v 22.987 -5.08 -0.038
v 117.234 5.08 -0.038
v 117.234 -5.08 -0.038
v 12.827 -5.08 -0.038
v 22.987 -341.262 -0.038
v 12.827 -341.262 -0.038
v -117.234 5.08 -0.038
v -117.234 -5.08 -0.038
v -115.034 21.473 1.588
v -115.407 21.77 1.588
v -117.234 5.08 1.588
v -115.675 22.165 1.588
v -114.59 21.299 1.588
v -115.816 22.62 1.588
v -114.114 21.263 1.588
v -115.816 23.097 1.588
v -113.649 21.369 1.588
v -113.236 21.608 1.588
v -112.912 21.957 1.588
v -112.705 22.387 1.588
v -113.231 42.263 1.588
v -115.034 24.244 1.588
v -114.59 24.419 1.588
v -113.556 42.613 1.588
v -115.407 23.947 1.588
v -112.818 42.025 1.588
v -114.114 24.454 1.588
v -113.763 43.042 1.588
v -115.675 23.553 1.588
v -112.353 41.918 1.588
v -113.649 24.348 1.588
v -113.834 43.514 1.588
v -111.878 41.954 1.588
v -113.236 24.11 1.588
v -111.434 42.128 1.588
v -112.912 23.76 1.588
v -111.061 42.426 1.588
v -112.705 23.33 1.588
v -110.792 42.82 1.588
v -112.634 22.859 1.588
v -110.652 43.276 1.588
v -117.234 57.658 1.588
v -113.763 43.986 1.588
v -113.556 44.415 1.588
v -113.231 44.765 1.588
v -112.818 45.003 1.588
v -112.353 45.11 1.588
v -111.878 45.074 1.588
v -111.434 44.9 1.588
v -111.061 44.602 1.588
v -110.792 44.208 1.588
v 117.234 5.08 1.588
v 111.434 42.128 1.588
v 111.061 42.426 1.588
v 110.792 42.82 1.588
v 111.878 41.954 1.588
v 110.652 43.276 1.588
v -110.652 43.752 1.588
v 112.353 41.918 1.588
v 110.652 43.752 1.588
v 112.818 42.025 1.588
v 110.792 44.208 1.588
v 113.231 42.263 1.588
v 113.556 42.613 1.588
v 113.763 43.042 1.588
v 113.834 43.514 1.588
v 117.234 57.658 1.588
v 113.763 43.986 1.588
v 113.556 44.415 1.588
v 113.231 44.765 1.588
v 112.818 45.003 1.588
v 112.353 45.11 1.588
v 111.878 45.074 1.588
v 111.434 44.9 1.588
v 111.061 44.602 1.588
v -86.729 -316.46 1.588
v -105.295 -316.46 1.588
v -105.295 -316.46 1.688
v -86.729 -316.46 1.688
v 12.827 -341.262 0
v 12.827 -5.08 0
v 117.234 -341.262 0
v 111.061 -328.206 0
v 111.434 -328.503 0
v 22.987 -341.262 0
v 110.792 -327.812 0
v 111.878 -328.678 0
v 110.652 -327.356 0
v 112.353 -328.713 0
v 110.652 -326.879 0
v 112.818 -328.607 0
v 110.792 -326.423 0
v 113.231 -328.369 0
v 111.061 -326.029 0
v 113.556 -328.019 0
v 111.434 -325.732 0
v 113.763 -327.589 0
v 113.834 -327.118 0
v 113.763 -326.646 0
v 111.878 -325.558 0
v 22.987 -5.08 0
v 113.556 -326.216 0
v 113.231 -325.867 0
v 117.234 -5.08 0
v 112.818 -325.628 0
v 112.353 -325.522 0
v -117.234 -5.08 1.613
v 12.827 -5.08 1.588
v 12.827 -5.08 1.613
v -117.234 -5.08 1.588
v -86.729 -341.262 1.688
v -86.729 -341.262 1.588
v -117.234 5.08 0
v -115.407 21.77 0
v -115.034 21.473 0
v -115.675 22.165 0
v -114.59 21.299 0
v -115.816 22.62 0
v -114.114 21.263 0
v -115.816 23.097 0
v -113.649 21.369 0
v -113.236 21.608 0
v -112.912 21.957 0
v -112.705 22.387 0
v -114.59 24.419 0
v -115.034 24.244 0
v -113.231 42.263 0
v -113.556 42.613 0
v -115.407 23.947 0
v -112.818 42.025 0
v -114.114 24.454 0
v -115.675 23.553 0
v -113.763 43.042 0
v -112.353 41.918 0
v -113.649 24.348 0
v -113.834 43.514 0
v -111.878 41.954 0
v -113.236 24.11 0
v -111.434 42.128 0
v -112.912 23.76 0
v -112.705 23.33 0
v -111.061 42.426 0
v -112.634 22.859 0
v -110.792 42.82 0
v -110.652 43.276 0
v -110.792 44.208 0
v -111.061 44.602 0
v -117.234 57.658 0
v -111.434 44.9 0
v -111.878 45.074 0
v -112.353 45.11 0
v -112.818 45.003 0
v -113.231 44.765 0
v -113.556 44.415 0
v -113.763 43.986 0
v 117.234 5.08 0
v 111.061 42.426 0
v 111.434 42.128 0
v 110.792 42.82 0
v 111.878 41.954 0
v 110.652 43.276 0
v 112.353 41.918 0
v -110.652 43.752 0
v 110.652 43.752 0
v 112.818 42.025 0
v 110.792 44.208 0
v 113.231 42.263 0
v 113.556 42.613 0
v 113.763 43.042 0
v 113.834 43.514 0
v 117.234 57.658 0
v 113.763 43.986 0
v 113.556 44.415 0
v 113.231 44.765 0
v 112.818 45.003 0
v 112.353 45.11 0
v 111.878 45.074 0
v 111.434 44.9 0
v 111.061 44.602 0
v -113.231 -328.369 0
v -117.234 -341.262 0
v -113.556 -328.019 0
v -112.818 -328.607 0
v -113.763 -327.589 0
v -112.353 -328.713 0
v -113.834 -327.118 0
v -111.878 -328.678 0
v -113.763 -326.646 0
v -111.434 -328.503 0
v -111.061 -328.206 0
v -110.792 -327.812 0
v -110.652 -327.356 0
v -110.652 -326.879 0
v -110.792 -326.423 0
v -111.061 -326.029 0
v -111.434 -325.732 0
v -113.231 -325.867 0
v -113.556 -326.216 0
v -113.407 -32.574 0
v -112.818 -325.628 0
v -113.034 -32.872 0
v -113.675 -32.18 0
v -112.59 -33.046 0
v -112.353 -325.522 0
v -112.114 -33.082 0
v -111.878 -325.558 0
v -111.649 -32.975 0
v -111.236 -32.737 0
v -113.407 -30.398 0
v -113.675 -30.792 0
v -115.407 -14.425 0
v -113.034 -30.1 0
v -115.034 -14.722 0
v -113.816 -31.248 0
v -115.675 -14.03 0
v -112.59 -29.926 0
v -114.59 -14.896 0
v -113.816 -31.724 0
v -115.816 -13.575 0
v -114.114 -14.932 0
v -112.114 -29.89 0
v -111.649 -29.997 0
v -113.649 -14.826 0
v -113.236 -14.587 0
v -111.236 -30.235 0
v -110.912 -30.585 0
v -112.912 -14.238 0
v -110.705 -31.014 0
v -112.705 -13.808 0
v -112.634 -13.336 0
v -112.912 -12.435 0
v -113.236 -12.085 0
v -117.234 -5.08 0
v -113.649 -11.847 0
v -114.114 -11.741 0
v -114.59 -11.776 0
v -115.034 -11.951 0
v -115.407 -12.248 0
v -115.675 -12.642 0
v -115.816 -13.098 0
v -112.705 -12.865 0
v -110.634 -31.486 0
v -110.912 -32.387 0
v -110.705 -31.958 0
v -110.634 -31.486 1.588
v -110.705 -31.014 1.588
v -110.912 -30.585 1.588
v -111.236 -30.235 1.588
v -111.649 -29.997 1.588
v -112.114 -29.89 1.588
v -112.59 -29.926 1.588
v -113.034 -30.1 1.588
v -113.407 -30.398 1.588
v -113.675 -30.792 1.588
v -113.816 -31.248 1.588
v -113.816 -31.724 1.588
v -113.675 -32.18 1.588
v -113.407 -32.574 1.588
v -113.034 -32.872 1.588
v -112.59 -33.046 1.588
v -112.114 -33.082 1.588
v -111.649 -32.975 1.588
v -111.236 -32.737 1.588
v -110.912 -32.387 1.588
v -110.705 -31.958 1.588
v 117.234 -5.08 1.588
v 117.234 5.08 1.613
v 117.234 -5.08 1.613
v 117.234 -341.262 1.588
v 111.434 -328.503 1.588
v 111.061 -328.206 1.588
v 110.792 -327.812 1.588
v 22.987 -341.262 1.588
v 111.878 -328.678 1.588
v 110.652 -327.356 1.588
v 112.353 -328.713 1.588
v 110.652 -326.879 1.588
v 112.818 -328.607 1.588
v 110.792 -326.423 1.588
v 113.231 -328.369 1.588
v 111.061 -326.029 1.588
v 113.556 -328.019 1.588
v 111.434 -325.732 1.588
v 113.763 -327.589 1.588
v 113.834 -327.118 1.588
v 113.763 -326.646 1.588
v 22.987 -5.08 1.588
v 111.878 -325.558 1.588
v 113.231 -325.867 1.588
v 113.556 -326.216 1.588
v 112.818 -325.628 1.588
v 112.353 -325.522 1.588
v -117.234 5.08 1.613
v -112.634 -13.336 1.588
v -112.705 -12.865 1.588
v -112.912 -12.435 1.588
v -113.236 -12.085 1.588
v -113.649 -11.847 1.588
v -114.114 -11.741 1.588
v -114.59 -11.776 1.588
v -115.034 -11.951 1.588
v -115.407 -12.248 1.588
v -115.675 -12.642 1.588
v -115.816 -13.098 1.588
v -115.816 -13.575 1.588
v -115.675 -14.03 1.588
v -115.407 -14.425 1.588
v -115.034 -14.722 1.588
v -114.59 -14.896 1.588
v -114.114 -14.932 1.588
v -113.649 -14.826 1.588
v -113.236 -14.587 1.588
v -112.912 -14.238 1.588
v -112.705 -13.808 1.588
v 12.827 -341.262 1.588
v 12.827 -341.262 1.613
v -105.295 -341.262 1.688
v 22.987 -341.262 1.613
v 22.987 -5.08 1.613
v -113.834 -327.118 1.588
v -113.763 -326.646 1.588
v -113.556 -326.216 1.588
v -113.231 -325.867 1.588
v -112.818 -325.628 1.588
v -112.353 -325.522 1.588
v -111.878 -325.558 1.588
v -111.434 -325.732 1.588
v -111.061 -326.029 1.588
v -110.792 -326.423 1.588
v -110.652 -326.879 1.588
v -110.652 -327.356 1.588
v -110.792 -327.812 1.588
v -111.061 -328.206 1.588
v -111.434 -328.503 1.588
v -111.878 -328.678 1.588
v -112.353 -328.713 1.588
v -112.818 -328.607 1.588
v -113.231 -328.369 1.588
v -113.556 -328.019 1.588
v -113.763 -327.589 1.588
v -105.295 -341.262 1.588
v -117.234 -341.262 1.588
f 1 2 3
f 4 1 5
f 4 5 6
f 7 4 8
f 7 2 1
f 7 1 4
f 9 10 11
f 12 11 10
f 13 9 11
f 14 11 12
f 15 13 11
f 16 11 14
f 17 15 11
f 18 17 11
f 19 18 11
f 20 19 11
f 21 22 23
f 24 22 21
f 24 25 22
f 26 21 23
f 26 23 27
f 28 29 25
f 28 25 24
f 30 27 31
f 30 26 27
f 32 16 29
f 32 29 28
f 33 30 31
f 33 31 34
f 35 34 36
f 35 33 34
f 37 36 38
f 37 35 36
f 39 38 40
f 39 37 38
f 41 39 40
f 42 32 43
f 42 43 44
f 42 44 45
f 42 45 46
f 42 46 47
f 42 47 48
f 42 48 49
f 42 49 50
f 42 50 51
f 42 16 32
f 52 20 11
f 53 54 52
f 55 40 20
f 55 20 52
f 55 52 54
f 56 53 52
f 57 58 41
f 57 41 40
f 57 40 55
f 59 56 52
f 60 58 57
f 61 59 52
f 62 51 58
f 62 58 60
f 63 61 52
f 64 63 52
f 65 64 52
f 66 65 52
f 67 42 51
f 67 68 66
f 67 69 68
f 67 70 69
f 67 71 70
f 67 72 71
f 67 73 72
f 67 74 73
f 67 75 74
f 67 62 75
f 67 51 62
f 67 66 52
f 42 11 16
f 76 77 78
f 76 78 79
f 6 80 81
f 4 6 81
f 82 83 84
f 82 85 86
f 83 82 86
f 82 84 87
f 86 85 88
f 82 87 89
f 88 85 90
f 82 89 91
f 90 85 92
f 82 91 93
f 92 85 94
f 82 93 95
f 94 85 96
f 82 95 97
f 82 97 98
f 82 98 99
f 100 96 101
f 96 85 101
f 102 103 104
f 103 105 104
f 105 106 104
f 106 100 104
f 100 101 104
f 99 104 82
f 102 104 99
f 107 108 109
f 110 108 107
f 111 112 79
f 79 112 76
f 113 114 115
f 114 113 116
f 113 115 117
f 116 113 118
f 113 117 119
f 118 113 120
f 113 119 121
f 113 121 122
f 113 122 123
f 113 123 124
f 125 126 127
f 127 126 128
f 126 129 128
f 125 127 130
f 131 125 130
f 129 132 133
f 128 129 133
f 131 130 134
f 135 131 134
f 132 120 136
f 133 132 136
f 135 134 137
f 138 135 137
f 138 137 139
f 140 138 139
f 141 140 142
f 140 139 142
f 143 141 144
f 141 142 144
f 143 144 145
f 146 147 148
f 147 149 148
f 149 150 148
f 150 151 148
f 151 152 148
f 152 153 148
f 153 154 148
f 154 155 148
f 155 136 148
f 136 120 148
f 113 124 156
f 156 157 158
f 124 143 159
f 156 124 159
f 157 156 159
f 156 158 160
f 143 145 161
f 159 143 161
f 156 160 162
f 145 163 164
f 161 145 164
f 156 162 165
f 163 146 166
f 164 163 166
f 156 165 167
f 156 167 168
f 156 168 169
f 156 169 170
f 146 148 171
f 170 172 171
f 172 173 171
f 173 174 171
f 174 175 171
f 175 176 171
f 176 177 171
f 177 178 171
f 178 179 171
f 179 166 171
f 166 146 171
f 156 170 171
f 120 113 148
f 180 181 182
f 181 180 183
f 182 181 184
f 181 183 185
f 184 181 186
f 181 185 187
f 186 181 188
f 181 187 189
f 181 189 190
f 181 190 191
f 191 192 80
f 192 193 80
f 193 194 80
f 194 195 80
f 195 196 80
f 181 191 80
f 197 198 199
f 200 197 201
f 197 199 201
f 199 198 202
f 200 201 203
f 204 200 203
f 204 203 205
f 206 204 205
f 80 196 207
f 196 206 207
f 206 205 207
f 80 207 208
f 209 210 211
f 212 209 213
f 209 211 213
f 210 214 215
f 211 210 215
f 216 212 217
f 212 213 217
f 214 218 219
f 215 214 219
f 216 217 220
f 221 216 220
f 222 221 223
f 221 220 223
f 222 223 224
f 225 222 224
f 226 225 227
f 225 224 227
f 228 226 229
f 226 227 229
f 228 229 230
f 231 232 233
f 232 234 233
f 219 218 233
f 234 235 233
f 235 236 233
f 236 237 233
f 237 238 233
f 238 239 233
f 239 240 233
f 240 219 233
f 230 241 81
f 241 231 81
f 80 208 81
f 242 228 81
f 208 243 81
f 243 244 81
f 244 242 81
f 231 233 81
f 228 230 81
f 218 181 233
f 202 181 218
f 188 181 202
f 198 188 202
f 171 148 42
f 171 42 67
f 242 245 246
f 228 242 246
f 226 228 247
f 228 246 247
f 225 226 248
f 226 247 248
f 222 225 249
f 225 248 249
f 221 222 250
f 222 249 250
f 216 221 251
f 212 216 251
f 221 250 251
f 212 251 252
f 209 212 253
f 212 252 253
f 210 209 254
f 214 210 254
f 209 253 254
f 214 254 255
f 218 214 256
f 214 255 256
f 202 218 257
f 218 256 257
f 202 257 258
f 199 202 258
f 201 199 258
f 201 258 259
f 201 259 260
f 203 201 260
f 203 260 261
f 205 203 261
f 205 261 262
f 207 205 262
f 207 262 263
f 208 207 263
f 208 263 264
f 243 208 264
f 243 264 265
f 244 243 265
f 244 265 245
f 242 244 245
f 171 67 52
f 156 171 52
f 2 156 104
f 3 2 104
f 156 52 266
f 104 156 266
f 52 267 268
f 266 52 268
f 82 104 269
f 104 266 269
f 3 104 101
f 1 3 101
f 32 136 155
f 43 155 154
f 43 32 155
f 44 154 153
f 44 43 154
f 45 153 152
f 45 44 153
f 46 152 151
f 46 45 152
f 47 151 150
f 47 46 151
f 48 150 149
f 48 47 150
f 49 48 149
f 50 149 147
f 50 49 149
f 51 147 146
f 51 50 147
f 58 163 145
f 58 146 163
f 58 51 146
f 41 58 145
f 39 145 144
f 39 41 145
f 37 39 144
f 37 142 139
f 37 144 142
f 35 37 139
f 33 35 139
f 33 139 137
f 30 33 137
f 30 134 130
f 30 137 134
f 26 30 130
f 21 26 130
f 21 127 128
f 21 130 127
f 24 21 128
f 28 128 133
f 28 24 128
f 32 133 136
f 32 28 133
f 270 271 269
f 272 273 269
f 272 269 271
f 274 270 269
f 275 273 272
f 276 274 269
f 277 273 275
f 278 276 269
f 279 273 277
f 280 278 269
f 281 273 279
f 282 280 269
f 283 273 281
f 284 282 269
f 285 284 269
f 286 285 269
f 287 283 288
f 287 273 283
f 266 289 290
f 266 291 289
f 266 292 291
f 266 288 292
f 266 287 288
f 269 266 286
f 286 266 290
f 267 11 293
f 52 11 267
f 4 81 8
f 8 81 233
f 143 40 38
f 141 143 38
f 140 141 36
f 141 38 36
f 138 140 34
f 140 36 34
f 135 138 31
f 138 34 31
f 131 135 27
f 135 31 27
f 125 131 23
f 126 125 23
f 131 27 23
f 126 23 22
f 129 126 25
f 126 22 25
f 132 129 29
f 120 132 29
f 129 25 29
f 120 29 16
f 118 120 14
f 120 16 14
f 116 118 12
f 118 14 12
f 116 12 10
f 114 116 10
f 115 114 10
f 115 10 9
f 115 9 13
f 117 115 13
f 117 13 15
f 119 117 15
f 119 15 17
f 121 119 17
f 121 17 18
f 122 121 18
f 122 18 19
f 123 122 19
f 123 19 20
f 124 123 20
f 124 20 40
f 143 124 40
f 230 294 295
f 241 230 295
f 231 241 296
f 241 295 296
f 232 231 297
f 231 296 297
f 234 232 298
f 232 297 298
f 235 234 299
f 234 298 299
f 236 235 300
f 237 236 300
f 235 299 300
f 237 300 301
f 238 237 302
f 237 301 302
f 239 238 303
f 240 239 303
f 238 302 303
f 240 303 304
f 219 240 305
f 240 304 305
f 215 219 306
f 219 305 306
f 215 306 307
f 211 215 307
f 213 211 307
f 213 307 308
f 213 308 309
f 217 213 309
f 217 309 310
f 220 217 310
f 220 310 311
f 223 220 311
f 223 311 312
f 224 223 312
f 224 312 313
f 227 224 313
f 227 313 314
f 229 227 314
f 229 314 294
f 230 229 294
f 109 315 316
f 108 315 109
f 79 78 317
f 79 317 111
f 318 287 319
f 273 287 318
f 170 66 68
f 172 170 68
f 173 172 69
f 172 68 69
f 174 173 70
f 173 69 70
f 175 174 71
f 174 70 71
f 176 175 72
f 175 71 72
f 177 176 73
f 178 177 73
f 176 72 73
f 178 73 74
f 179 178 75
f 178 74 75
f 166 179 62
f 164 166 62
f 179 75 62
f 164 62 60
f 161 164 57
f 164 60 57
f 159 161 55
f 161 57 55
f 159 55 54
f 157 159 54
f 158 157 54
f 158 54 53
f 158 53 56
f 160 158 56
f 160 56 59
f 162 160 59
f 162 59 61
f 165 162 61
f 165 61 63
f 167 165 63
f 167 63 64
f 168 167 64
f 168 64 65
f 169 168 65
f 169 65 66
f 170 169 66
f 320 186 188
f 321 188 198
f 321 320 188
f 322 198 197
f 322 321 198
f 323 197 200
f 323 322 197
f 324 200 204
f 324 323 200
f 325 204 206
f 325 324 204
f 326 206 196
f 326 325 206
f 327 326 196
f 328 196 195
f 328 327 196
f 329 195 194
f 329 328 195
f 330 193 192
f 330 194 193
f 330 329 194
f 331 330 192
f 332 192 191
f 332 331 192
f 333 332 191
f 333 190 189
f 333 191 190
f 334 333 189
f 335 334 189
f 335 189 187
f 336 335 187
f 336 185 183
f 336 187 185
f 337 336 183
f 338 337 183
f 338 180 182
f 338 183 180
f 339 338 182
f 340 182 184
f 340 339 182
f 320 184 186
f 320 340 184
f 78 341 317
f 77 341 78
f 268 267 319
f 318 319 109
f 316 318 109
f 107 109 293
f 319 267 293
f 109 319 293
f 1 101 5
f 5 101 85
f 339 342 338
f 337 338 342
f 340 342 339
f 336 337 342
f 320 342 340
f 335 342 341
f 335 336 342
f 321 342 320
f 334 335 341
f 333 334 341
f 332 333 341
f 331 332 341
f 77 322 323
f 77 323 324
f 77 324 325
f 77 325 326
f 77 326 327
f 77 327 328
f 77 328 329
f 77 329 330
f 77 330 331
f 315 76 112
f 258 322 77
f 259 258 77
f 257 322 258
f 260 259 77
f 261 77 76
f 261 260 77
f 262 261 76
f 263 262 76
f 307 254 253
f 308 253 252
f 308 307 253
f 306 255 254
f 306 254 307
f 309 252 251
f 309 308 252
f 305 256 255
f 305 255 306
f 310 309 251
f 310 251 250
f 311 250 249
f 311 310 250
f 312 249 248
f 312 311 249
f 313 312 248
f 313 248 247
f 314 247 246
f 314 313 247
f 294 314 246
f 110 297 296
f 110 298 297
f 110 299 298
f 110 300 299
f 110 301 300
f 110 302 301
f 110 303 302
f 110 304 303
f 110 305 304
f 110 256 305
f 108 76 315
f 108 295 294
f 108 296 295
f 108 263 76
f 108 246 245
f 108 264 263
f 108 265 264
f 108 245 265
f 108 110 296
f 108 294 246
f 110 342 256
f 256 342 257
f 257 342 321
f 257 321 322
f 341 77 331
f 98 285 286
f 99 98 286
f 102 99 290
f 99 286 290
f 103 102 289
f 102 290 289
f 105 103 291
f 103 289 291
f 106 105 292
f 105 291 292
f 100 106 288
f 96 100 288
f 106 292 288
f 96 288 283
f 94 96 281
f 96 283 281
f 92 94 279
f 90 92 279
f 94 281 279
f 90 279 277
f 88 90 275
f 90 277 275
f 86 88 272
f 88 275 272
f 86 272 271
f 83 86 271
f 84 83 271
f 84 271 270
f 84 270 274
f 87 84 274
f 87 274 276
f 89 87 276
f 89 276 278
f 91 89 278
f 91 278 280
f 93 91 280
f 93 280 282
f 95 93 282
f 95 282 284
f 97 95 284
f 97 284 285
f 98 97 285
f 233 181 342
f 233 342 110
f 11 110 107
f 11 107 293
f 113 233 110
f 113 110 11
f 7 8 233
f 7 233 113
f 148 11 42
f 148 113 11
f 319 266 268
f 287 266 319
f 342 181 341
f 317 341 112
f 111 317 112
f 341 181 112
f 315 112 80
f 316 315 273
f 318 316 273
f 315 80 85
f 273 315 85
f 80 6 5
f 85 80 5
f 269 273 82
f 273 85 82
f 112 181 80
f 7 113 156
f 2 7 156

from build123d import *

# Parameters (mm, degrees)
SKETCH1_W                = 234.4674
SKETCH1_H                = 398.9197
BOSS_EXTRUDE1_DEPTH      = 1.5875
BOSS_EXTRUDE2_DEPTH      = 0.0254
BOSS_EXTRUDE2_DEPTH_BACK = 1.6254
SKETCH5_R                = 1.6
CUT_EXTRUDE1_DEPTH       = 2.6254
SKETCH6_W                = 18.565945636
SKETCH6_H                = 24.802104659
BOSS_EXTRUDE3_DEPTH      = 0.1
SKETCH8_R                = 1.6
CUT_EXTRUDE2_DEPTH       = 2.6254
SKETCH7_R                = 1.6
CUT_EXTRUDE3_DEPTH       = 10


with BuildPart() as part:
    # Sketch1 → Boss-Extrude1 (new body)
    with BuildSketch(Plane.XY):
        with Locations((0, -141.80185)):
            Rectangle(SKETCH1_W, SKETCH1_H)
    extrude(amount=BOSS_EXTRUDE1_DEPTH)

    # Sketch4 → Boss-Extrude2 (add, two sides)
    with BuildSketch(Plane.XY.offset(1.5875)) as boss_extrude2_sk:
        Polygon((-117.2337, 5.08), (117.2337, 5.08), (117.2337, -5.08), (22.987, -5.08), (22.987, -341.2617), (12.827, -341.2617), (12.827, -5.08), (-117.2337, -5.08), align=None)
    extrude(amount=BOSS_EXTRUDE2_DEPTH)
    extrude(boss_extrude2_sk.sketch, amount=-BOSS_EXTRUDE2_DEPTH_BACK)

    # Sketch5 → Cut-Extrude1 (cut, through all)
    with BuildSketch(Plane.XY.offset(1.5875)):
        with Locations((112.2337, 43.514)):
            Circle(SKETCH5_R)
        with Locations((112.2337, -327.1177)):
            Circle(SKETCH5_R)
    cut_extrude1 = extrude(amount=-CUT_EXTRUDE1_DEPTH, mode=Mode.SUBTRACT)

    # Mirror3: Cut-Extrude1 across plane
    add(cut_extrude1.mirror(Plane(origin=(0, 0, 0), x_dir=(0, 0, 1), z_dir=(1, 0, 0))), mode=Mode.SUBTRACT)

    # Sketch6 → Boss-Extrude3 (add)
    with BuildSketch(Plane.XY.offset(1.5875)):
        with Locations((-96.012, -328.860647671)):
            Rectangle(SKETCH6_W, SKETCH6_H)
    extrude(amount=BOSS_EXTRUDE3_DEPTH)

    # Sketch8 → Cut-Extrude2 (cut, through all)
    with BuildSketch(Plane.XY.offset(1.5875)):
        with Locations((-114.2337, 22.85873)):
            Circle(SKETCH8_R)
        with Locations((-114.2337, -13.33627)):
            Circle(SKETCH8_R)
    extrude(amount=-CUT_EXTRUDE2_DEPTH, mode=Mode.SUBTRACT)

    # Sketch7 → Cut-Extrude3 (cut)
    with BuildSketch(Plane.XY.offset(1.5875)):
        with Locations((-112.2337, -31.486)):
            Circle(SKETCH7_R)
    extrude(amount=-CUT_EXTRUDE3_DEPTH, mode=Mode.SUBTRACT)


solid = part.part
